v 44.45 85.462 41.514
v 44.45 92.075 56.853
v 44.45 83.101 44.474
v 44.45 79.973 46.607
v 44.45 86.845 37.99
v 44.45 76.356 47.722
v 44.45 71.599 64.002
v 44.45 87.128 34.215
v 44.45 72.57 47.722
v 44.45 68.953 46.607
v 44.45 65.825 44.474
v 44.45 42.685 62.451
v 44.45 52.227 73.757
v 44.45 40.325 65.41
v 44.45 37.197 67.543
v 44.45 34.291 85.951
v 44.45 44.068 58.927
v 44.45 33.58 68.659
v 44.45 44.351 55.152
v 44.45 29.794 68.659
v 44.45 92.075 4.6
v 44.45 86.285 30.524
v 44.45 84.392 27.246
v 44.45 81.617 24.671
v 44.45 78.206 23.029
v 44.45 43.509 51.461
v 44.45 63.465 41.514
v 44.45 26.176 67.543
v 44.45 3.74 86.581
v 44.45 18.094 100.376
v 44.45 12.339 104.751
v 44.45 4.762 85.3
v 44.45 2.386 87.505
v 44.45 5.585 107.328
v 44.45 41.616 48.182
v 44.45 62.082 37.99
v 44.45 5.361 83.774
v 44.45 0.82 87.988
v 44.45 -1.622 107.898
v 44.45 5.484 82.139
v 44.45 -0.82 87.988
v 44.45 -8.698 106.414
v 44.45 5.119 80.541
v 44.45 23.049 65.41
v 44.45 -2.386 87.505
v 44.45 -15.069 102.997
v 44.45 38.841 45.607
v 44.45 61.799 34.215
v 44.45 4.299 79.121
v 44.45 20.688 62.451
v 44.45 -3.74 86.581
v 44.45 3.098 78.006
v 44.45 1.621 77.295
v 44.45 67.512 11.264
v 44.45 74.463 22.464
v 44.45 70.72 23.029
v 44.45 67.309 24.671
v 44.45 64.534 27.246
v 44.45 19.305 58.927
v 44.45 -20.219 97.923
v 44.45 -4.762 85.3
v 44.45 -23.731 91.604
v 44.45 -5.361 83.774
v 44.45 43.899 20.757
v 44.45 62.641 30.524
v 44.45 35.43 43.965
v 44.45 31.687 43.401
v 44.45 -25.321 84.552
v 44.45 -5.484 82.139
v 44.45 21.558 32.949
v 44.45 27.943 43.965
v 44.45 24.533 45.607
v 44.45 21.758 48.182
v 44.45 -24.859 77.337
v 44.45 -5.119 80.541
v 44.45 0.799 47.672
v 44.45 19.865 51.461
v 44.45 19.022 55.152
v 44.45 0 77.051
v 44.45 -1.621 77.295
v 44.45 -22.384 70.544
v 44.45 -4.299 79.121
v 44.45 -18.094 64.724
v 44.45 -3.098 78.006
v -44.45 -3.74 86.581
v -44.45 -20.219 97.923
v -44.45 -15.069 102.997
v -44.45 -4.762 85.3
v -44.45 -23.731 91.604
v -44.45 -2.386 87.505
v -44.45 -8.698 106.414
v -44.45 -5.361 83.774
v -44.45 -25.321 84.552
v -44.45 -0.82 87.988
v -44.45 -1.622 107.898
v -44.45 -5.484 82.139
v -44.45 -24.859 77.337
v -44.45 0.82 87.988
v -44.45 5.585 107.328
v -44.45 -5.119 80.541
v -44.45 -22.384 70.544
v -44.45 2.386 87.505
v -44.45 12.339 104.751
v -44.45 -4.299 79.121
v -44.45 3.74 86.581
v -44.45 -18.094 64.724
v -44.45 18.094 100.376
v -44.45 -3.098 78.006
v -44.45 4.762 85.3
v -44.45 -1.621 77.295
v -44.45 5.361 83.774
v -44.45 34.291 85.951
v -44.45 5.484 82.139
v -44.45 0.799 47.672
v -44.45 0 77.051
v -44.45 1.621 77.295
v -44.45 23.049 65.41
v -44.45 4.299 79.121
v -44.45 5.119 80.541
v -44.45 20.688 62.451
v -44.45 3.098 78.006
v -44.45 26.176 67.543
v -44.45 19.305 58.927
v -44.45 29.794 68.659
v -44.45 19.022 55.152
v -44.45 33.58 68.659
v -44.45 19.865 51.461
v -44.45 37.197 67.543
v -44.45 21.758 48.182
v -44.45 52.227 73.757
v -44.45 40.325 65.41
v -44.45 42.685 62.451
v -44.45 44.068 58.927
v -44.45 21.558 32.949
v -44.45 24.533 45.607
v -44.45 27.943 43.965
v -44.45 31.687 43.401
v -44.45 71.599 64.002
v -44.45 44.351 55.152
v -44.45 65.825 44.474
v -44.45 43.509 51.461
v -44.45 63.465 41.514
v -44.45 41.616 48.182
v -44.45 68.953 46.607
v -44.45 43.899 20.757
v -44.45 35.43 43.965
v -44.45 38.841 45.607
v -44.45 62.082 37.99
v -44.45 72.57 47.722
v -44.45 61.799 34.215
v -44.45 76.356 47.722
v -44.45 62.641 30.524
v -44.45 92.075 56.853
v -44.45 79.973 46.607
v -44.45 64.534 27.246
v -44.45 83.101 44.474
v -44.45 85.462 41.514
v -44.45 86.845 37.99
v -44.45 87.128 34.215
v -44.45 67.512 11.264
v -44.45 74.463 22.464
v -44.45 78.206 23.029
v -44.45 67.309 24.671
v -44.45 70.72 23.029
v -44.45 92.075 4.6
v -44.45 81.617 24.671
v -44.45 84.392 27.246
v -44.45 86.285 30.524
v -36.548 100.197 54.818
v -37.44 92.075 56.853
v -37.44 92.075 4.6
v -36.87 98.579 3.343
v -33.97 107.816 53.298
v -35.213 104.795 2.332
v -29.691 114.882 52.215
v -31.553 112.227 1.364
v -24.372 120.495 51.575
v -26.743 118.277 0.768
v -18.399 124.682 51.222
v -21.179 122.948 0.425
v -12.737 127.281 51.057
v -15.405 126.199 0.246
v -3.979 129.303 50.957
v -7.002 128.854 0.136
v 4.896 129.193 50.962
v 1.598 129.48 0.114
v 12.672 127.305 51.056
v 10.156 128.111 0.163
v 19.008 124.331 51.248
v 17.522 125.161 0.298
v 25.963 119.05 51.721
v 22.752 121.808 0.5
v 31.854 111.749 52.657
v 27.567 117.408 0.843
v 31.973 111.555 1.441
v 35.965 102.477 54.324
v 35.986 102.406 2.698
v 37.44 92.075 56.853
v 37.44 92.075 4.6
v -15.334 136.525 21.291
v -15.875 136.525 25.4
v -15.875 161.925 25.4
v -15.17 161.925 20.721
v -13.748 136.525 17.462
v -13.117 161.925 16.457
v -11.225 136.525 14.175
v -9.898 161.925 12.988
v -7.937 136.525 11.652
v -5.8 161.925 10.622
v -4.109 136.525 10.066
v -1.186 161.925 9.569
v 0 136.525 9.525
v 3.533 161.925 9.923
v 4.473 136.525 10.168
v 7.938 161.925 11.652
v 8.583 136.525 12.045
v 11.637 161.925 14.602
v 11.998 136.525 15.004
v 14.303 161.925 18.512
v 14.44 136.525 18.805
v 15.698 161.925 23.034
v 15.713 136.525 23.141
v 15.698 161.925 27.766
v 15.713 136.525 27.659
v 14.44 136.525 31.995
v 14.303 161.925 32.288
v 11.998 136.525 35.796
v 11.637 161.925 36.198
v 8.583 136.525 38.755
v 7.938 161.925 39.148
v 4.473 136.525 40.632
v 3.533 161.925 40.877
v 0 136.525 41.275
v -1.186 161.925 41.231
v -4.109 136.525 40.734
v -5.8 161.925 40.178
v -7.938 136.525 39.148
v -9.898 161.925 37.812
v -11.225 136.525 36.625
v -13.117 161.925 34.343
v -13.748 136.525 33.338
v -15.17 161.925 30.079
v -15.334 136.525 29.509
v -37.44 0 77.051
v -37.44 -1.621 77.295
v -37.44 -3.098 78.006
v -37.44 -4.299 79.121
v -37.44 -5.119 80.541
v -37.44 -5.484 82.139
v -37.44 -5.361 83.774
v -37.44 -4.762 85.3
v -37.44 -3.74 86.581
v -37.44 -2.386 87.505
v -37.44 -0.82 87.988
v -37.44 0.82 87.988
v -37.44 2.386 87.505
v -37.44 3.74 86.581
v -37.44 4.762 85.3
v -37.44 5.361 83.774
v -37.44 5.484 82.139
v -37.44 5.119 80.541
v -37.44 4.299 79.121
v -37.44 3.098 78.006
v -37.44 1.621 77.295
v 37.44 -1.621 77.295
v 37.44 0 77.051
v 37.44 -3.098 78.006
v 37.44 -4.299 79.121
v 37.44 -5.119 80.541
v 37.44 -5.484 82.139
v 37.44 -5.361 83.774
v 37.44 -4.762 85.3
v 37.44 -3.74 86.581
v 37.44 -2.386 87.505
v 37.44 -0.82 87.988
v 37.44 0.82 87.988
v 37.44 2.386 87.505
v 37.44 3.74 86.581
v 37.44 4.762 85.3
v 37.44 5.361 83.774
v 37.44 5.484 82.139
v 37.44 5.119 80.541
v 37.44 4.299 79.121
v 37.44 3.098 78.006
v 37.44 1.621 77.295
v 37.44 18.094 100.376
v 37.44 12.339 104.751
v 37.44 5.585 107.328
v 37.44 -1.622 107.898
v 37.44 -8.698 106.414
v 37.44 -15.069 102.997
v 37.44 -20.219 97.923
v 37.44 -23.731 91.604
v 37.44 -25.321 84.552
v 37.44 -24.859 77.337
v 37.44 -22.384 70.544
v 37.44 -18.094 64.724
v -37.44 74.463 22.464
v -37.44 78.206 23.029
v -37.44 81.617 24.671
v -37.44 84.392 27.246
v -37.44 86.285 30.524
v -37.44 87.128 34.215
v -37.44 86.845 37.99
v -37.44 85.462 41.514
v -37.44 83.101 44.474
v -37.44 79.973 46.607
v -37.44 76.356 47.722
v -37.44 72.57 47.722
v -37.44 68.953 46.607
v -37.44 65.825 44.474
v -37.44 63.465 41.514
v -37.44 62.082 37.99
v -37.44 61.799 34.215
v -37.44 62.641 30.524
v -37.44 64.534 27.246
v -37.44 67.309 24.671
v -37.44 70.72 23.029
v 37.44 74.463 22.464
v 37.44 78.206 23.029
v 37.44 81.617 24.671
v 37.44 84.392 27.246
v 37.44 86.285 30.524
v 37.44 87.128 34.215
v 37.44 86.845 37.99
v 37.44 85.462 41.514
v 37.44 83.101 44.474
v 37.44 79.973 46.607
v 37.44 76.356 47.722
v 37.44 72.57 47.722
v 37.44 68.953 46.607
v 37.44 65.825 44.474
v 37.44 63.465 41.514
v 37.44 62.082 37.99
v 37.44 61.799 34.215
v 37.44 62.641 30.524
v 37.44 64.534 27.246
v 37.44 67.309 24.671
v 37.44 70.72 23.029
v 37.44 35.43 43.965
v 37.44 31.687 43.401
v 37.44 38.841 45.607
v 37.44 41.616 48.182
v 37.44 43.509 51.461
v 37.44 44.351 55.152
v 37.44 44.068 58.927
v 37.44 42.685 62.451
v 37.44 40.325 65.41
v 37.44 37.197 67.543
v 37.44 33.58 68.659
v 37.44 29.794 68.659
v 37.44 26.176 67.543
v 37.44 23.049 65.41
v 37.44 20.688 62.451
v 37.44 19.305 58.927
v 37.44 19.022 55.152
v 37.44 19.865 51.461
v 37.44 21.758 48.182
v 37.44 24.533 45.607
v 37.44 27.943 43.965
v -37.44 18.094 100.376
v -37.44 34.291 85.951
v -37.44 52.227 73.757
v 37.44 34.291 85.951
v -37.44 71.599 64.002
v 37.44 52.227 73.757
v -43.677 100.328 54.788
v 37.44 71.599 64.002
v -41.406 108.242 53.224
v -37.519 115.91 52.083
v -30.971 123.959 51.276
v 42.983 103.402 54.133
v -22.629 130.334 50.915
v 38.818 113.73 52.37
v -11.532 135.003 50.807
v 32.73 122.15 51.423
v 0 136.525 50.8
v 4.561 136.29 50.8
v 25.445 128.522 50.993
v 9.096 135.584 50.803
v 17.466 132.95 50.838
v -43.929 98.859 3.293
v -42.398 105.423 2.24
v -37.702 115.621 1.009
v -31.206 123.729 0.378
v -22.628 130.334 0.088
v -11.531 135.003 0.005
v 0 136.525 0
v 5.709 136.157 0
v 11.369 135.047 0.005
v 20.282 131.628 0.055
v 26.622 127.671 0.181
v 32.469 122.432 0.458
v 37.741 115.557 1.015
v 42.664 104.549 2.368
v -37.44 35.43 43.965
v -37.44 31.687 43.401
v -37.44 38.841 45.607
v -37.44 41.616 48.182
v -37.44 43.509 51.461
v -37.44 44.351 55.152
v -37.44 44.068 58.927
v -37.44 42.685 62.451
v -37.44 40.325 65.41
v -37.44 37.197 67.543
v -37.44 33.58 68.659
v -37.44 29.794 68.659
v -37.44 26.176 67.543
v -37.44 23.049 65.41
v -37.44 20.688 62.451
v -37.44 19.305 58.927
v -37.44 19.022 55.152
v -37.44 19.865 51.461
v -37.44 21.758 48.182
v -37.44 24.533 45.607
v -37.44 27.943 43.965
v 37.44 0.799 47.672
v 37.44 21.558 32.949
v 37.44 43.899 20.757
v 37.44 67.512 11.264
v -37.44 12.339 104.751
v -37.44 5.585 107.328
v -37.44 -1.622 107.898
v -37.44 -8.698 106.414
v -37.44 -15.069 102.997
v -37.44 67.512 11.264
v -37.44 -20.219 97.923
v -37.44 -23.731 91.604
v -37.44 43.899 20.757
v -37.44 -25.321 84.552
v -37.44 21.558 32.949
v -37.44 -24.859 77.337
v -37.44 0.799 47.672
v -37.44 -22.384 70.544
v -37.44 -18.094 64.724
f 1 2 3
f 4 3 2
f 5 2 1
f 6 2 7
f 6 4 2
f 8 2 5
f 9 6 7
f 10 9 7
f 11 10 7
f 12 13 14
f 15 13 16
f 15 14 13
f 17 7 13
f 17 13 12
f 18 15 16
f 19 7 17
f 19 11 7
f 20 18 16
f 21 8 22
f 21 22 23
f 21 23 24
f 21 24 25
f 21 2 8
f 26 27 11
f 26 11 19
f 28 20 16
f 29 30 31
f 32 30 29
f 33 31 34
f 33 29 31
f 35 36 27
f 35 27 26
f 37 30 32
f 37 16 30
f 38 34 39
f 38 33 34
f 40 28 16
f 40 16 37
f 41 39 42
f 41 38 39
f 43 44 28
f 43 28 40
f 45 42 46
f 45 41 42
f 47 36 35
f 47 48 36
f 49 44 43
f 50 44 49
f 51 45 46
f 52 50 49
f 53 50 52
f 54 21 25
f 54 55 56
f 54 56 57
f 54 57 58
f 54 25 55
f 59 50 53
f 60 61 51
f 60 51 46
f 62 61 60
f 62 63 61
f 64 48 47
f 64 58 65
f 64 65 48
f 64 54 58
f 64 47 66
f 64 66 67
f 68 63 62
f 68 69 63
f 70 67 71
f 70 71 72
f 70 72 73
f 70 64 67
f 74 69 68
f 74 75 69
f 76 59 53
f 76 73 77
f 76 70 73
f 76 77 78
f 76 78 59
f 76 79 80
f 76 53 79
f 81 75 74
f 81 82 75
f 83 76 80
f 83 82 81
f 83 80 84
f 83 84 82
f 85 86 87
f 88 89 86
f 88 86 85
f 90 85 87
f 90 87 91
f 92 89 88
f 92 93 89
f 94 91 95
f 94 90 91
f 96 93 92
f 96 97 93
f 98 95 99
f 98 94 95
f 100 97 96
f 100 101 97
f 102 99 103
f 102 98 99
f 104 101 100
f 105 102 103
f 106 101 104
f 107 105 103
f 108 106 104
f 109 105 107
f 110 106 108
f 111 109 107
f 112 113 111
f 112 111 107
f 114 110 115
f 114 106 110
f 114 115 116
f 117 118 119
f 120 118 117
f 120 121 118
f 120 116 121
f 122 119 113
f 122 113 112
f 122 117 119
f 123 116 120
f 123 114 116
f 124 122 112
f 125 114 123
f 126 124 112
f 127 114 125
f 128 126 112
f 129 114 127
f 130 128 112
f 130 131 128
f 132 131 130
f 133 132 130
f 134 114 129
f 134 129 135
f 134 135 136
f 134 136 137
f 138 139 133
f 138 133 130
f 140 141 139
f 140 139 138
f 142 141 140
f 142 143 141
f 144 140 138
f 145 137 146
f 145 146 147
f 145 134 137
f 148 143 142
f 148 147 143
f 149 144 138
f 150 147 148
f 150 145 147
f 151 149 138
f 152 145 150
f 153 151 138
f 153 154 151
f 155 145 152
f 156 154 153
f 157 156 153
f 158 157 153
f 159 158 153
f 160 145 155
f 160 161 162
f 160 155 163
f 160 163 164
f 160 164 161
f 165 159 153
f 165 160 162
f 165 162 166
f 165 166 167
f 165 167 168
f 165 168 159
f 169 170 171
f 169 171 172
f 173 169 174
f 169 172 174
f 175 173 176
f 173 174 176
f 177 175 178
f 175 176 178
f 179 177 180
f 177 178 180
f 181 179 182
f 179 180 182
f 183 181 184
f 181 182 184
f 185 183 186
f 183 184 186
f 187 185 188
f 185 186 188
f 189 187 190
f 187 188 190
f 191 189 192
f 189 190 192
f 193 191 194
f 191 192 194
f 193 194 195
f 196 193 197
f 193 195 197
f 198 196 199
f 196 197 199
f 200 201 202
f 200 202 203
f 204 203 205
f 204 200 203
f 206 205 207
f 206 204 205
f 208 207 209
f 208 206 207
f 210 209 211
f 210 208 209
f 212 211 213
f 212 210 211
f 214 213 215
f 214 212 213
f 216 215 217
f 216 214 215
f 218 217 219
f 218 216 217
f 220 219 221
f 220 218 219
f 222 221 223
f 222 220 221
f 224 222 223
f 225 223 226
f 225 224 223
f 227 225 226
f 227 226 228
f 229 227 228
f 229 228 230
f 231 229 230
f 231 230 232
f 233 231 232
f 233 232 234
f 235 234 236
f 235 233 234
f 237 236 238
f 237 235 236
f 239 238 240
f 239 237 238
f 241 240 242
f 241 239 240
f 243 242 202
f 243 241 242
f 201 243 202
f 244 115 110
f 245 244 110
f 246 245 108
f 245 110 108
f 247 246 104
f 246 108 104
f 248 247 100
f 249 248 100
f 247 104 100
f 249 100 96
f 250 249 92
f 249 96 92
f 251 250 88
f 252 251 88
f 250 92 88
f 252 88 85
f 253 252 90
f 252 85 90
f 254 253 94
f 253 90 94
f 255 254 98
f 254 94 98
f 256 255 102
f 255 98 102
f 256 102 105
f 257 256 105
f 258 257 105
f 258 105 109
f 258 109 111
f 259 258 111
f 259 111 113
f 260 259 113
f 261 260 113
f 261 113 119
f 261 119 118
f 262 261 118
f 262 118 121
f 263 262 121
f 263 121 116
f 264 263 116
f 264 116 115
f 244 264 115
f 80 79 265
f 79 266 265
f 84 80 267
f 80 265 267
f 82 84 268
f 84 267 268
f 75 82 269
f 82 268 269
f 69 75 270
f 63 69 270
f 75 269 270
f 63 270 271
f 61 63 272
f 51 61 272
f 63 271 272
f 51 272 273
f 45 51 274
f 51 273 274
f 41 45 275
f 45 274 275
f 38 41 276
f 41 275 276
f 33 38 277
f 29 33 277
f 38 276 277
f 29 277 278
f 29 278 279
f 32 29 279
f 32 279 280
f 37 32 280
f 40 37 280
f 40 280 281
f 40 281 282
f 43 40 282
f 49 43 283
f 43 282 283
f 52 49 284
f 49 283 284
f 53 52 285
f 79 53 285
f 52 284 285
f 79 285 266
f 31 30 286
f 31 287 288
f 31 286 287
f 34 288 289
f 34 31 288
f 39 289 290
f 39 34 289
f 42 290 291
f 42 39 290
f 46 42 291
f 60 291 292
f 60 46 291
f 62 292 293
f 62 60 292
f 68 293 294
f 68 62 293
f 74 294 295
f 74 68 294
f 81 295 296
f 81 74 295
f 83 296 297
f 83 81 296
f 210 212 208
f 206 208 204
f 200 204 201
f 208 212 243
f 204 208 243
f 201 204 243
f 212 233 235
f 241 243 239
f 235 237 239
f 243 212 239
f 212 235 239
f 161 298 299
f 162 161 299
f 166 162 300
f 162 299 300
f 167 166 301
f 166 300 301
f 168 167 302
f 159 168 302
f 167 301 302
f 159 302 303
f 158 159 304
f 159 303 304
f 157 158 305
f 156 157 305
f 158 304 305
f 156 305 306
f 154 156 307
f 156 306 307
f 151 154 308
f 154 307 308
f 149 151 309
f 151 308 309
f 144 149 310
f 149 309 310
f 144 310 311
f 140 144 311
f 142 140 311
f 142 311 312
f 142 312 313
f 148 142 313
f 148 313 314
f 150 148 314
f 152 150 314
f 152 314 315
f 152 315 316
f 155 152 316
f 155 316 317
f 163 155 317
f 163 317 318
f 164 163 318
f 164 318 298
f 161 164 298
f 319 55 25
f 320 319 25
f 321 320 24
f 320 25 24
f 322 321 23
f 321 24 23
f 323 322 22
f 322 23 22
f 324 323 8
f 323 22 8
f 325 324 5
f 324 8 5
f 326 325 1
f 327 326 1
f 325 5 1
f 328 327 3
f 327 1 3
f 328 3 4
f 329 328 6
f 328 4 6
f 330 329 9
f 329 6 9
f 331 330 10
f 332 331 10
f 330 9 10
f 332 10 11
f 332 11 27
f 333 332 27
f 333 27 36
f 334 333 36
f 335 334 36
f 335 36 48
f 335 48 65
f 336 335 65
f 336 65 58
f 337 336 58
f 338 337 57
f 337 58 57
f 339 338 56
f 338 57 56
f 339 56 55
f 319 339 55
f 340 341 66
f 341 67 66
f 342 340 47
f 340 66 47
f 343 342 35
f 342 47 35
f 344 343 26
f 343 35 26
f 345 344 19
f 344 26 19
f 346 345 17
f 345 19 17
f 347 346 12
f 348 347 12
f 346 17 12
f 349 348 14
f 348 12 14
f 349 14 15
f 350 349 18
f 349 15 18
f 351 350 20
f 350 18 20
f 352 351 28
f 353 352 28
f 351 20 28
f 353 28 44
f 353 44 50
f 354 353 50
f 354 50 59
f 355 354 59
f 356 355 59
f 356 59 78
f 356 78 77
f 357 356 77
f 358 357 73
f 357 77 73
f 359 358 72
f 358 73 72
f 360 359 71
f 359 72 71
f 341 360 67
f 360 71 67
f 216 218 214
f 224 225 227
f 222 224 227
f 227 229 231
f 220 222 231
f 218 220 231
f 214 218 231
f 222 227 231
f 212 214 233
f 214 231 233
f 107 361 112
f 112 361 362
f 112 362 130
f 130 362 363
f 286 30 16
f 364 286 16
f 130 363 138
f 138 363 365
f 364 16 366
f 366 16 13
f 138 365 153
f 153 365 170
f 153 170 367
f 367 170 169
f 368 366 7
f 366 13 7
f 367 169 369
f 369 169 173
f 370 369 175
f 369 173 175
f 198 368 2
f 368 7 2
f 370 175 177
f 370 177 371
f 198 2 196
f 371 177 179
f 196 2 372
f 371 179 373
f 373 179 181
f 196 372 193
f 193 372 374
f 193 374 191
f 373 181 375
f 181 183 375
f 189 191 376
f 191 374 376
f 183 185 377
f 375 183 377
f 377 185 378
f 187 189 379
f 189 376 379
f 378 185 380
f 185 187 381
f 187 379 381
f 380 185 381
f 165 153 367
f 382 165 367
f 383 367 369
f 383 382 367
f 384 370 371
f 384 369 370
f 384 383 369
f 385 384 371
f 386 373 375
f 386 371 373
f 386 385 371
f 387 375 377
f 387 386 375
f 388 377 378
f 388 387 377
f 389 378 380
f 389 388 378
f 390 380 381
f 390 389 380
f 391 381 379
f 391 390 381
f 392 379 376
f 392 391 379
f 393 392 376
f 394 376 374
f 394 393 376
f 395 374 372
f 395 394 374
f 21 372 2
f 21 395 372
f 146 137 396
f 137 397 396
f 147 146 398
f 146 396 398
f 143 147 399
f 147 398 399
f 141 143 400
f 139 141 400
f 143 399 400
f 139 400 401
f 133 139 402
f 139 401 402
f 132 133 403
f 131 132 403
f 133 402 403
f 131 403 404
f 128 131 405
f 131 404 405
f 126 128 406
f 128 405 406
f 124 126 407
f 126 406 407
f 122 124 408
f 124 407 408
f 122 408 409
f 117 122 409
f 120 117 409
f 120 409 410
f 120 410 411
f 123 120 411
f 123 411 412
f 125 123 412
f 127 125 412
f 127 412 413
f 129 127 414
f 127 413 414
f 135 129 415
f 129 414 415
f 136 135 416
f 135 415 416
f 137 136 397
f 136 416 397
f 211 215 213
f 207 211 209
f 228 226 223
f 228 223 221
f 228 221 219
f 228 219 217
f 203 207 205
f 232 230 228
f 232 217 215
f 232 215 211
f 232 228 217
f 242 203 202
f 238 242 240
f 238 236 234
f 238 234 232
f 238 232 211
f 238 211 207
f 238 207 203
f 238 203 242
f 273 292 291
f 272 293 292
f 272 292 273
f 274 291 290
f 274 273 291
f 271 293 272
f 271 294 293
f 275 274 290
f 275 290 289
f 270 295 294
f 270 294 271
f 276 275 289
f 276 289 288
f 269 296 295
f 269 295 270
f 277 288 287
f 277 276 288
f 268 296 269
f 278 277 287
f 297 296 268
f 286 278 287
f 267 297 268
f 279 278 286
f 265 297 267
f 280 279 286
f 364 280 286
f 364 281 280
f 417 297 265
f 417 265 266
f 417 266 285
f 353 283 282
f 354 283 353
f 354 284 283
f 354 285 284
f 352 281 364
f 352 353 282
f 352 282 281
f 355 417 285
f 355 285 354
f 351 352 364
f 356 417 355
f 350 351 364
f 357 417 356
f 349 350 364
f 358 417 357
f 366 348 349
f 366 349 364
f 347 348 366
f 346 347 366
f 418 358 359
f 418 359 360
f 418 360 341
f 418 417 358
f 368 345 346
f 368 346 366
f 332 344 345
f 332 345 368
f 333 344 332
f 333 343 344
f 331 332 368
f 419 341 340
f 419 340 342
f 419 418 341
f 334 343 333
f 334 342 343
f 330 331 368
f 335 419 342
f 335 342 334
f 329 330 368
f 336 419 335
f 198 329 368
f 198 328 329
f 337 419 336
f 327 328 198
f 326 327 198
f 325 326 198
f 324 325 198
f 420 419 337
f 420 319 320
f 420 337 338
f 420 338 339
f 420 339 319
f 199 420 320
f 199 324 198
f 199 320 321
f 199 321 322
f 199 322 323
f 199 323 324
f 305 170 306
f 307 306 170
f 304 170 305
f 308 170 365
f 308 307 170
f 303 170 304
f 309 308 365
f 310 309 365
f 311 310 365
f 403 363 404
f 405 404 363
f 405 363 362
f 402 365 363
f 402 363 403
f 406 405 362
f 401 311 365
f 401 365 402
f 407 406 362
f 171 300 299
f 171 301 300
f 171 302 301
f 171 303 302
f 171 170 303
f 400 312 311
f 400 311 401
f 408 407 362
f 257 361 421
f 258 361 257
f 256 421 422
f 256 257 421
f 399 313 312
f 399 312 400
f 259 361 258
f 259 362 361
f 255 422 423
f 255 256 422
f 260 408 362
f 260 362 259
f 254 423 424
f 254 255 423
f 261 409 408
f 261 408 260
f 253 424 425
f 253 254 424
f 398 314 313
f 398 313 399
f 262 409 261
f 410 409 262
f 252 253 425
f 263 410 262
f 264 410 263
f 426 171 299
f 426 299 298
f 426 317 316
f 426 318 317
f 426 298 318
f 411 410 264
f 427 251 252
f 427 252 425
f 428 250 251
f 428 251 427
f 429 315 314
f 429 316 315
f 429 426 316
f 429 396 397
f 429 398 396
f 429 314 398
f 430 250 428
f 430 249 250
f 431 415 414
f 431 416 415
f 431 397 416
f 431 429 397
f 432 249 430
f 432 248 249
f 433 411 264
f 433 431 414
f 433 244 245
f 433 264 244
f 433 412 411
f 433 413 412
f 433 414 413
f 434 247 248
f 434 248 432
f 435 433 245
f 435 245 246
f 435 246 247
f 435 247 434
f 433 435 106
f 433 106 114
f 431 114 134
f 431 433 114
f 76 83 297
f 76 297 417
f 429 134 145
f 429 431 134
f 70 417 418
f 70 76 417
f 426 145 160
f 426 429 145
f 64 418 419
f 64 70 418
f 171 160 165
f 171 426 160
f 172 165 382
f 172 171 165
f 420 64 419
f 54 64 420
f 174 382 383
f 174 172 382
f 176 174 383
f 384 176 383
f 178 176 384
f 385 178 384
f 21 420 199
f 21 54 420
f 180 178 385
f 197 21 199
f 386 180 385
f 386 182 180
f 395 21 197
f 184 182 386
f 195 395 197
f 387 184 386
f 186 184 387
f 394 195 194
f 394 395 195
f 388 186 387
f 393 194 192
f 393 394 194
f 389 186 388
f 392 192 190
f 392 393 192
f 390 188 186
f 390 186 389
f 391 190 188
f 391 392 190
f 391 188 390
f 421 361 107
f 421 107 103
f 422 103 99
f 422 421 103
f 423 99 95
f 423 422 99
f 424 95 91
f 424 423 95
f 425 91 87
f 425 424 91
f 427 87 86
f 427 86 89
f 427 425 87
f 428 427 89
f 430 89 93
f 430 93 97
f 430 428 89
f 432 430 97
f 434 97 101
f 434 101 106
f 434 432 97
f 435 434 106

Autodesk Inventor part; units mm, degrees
ref_plane "YZ Plane" through (0, 0, 0) normal (1, 0, 0) x (0, 1, 0)
ref_plane "XY Plane" through (0, 0, 0) normal (0, 0, 1) x (1, 0, 0)
sketch "Sketch1" plane through (0, 0, 0) normal (0, 0, 1) x (1, 0, 0)
  line L0 (-37.4396, -25.4) -> (-44.45, -25.4)
  line L1 (-44.45, -25.4) -> (-44.45, 92.075)
  line L2 (-44.45, 92.075) -> (-37.4396, 92.075)
  line L3 (-37.4396, 92.075) -> (-37.4396, -25.4)
  line L4 (44.45, -25.4) -> (37.4396, -25.4)
  line L5 (37.4396, -25.4) -> (37.4396, 92.075)
  line L6 (37.4396, 92.075) -> (44.45, 92.075)
  line L7 (44.45, 92.075) -> (44.45, -25.4)
  arc A0 (37.4396, 92.075) -> (-37.4396, 92.075) centre (0, 92.075) ccw
  arc A1 (44.45, 92.075) -> (-44.45, 92.075) centre (0, 92.075) ccw
  line L8 (0, 136.525) -> (-29.2204, 136.525)
  point P0 (0, 0)
  dimension "d0" = 161.925
  dimension "d1" = 7.0104
  dimension "d2" = 88.9
  dimension "d3" = 25.4
extrude "Extrusion1" add sketch "Sketch1" along normal blind 107.95
sketch "Sketch2" plane through (44.45, -25.4, 0) normal (1, 0, 0) x (0, 0, -1)
  line L0 (-107.95, 117.475) -> (-107.95, 0) projected
  line L1 (0, 0) -> (-107.95, 0) projected
  line L2 (0, 0) -> (0, 117.475) projected
  line L3 (0, 117.475) -> (-107.95, 117.475) projected
  circle A0 centre (-82.55, 25.4) radius 25.4
  arc A1 (-64.7244, 7.3056) -> (0, 161.925) centre (-217.0465, 161.925) ccw
  arc A2 (-100.3756, 43.4944) -> (-50.8, 161.925) centre (-217.0465, 161.925) ccw
  line L4 (0, 161.925) -> (-50.8, 161.925)
  circle A3 centre (-56.1006, 57.0868) radius 12.7
  circle A4 centre (-35.1643, 99.8631) radius 12.7
  arc A5 (-82.55, 25.4) -> (-25.4, 161.925) centre (-210.7426, 159.2862) ccw
  point P0 (0, 25.4)
  dimension "d7" = 50.8
  dimension "d8" = 161.925
  dimension "d9" = 25.4
  dimension "d10" = 47.625
  dimension "d11" = 41.275
  dimension "d12" = 185.3614
extrude "Extrusion2" cut sketch "Sketch2" against normal through all contours A0 | A2 L4 A5 L3 | L3 A5 A4 A3 A0 A2 | A5 L4 A1 L3 | L3 A1 A0 A5 A3 A4 keep common part
hole "Hole1" at (44.45, 0, 82.55) direction (-1, 0, 0) diameter 10.9982 end through all clearance for "Flat Head Machine Screw" size "M10" standard "Ansi Metric M Profile"
ref_plane "Work Plane1" through (0, 136.525, 0) normal (0, 1, 0) x (-1, 0, 0)
sketch "Sketch3" plane through (0, 136.525, 0) normal (0, 1, 0) x (-1, 0, 0)
  circle A0 centre (0, 25.4) radius 15.875
  point P0 (0, 0)
  dimension "d24" = 25.4
  dimension "d25" = 31.75
extrude "Extrusion3" add sketch "Sketch3" along normal blind 25.4
properties part number "caster"
